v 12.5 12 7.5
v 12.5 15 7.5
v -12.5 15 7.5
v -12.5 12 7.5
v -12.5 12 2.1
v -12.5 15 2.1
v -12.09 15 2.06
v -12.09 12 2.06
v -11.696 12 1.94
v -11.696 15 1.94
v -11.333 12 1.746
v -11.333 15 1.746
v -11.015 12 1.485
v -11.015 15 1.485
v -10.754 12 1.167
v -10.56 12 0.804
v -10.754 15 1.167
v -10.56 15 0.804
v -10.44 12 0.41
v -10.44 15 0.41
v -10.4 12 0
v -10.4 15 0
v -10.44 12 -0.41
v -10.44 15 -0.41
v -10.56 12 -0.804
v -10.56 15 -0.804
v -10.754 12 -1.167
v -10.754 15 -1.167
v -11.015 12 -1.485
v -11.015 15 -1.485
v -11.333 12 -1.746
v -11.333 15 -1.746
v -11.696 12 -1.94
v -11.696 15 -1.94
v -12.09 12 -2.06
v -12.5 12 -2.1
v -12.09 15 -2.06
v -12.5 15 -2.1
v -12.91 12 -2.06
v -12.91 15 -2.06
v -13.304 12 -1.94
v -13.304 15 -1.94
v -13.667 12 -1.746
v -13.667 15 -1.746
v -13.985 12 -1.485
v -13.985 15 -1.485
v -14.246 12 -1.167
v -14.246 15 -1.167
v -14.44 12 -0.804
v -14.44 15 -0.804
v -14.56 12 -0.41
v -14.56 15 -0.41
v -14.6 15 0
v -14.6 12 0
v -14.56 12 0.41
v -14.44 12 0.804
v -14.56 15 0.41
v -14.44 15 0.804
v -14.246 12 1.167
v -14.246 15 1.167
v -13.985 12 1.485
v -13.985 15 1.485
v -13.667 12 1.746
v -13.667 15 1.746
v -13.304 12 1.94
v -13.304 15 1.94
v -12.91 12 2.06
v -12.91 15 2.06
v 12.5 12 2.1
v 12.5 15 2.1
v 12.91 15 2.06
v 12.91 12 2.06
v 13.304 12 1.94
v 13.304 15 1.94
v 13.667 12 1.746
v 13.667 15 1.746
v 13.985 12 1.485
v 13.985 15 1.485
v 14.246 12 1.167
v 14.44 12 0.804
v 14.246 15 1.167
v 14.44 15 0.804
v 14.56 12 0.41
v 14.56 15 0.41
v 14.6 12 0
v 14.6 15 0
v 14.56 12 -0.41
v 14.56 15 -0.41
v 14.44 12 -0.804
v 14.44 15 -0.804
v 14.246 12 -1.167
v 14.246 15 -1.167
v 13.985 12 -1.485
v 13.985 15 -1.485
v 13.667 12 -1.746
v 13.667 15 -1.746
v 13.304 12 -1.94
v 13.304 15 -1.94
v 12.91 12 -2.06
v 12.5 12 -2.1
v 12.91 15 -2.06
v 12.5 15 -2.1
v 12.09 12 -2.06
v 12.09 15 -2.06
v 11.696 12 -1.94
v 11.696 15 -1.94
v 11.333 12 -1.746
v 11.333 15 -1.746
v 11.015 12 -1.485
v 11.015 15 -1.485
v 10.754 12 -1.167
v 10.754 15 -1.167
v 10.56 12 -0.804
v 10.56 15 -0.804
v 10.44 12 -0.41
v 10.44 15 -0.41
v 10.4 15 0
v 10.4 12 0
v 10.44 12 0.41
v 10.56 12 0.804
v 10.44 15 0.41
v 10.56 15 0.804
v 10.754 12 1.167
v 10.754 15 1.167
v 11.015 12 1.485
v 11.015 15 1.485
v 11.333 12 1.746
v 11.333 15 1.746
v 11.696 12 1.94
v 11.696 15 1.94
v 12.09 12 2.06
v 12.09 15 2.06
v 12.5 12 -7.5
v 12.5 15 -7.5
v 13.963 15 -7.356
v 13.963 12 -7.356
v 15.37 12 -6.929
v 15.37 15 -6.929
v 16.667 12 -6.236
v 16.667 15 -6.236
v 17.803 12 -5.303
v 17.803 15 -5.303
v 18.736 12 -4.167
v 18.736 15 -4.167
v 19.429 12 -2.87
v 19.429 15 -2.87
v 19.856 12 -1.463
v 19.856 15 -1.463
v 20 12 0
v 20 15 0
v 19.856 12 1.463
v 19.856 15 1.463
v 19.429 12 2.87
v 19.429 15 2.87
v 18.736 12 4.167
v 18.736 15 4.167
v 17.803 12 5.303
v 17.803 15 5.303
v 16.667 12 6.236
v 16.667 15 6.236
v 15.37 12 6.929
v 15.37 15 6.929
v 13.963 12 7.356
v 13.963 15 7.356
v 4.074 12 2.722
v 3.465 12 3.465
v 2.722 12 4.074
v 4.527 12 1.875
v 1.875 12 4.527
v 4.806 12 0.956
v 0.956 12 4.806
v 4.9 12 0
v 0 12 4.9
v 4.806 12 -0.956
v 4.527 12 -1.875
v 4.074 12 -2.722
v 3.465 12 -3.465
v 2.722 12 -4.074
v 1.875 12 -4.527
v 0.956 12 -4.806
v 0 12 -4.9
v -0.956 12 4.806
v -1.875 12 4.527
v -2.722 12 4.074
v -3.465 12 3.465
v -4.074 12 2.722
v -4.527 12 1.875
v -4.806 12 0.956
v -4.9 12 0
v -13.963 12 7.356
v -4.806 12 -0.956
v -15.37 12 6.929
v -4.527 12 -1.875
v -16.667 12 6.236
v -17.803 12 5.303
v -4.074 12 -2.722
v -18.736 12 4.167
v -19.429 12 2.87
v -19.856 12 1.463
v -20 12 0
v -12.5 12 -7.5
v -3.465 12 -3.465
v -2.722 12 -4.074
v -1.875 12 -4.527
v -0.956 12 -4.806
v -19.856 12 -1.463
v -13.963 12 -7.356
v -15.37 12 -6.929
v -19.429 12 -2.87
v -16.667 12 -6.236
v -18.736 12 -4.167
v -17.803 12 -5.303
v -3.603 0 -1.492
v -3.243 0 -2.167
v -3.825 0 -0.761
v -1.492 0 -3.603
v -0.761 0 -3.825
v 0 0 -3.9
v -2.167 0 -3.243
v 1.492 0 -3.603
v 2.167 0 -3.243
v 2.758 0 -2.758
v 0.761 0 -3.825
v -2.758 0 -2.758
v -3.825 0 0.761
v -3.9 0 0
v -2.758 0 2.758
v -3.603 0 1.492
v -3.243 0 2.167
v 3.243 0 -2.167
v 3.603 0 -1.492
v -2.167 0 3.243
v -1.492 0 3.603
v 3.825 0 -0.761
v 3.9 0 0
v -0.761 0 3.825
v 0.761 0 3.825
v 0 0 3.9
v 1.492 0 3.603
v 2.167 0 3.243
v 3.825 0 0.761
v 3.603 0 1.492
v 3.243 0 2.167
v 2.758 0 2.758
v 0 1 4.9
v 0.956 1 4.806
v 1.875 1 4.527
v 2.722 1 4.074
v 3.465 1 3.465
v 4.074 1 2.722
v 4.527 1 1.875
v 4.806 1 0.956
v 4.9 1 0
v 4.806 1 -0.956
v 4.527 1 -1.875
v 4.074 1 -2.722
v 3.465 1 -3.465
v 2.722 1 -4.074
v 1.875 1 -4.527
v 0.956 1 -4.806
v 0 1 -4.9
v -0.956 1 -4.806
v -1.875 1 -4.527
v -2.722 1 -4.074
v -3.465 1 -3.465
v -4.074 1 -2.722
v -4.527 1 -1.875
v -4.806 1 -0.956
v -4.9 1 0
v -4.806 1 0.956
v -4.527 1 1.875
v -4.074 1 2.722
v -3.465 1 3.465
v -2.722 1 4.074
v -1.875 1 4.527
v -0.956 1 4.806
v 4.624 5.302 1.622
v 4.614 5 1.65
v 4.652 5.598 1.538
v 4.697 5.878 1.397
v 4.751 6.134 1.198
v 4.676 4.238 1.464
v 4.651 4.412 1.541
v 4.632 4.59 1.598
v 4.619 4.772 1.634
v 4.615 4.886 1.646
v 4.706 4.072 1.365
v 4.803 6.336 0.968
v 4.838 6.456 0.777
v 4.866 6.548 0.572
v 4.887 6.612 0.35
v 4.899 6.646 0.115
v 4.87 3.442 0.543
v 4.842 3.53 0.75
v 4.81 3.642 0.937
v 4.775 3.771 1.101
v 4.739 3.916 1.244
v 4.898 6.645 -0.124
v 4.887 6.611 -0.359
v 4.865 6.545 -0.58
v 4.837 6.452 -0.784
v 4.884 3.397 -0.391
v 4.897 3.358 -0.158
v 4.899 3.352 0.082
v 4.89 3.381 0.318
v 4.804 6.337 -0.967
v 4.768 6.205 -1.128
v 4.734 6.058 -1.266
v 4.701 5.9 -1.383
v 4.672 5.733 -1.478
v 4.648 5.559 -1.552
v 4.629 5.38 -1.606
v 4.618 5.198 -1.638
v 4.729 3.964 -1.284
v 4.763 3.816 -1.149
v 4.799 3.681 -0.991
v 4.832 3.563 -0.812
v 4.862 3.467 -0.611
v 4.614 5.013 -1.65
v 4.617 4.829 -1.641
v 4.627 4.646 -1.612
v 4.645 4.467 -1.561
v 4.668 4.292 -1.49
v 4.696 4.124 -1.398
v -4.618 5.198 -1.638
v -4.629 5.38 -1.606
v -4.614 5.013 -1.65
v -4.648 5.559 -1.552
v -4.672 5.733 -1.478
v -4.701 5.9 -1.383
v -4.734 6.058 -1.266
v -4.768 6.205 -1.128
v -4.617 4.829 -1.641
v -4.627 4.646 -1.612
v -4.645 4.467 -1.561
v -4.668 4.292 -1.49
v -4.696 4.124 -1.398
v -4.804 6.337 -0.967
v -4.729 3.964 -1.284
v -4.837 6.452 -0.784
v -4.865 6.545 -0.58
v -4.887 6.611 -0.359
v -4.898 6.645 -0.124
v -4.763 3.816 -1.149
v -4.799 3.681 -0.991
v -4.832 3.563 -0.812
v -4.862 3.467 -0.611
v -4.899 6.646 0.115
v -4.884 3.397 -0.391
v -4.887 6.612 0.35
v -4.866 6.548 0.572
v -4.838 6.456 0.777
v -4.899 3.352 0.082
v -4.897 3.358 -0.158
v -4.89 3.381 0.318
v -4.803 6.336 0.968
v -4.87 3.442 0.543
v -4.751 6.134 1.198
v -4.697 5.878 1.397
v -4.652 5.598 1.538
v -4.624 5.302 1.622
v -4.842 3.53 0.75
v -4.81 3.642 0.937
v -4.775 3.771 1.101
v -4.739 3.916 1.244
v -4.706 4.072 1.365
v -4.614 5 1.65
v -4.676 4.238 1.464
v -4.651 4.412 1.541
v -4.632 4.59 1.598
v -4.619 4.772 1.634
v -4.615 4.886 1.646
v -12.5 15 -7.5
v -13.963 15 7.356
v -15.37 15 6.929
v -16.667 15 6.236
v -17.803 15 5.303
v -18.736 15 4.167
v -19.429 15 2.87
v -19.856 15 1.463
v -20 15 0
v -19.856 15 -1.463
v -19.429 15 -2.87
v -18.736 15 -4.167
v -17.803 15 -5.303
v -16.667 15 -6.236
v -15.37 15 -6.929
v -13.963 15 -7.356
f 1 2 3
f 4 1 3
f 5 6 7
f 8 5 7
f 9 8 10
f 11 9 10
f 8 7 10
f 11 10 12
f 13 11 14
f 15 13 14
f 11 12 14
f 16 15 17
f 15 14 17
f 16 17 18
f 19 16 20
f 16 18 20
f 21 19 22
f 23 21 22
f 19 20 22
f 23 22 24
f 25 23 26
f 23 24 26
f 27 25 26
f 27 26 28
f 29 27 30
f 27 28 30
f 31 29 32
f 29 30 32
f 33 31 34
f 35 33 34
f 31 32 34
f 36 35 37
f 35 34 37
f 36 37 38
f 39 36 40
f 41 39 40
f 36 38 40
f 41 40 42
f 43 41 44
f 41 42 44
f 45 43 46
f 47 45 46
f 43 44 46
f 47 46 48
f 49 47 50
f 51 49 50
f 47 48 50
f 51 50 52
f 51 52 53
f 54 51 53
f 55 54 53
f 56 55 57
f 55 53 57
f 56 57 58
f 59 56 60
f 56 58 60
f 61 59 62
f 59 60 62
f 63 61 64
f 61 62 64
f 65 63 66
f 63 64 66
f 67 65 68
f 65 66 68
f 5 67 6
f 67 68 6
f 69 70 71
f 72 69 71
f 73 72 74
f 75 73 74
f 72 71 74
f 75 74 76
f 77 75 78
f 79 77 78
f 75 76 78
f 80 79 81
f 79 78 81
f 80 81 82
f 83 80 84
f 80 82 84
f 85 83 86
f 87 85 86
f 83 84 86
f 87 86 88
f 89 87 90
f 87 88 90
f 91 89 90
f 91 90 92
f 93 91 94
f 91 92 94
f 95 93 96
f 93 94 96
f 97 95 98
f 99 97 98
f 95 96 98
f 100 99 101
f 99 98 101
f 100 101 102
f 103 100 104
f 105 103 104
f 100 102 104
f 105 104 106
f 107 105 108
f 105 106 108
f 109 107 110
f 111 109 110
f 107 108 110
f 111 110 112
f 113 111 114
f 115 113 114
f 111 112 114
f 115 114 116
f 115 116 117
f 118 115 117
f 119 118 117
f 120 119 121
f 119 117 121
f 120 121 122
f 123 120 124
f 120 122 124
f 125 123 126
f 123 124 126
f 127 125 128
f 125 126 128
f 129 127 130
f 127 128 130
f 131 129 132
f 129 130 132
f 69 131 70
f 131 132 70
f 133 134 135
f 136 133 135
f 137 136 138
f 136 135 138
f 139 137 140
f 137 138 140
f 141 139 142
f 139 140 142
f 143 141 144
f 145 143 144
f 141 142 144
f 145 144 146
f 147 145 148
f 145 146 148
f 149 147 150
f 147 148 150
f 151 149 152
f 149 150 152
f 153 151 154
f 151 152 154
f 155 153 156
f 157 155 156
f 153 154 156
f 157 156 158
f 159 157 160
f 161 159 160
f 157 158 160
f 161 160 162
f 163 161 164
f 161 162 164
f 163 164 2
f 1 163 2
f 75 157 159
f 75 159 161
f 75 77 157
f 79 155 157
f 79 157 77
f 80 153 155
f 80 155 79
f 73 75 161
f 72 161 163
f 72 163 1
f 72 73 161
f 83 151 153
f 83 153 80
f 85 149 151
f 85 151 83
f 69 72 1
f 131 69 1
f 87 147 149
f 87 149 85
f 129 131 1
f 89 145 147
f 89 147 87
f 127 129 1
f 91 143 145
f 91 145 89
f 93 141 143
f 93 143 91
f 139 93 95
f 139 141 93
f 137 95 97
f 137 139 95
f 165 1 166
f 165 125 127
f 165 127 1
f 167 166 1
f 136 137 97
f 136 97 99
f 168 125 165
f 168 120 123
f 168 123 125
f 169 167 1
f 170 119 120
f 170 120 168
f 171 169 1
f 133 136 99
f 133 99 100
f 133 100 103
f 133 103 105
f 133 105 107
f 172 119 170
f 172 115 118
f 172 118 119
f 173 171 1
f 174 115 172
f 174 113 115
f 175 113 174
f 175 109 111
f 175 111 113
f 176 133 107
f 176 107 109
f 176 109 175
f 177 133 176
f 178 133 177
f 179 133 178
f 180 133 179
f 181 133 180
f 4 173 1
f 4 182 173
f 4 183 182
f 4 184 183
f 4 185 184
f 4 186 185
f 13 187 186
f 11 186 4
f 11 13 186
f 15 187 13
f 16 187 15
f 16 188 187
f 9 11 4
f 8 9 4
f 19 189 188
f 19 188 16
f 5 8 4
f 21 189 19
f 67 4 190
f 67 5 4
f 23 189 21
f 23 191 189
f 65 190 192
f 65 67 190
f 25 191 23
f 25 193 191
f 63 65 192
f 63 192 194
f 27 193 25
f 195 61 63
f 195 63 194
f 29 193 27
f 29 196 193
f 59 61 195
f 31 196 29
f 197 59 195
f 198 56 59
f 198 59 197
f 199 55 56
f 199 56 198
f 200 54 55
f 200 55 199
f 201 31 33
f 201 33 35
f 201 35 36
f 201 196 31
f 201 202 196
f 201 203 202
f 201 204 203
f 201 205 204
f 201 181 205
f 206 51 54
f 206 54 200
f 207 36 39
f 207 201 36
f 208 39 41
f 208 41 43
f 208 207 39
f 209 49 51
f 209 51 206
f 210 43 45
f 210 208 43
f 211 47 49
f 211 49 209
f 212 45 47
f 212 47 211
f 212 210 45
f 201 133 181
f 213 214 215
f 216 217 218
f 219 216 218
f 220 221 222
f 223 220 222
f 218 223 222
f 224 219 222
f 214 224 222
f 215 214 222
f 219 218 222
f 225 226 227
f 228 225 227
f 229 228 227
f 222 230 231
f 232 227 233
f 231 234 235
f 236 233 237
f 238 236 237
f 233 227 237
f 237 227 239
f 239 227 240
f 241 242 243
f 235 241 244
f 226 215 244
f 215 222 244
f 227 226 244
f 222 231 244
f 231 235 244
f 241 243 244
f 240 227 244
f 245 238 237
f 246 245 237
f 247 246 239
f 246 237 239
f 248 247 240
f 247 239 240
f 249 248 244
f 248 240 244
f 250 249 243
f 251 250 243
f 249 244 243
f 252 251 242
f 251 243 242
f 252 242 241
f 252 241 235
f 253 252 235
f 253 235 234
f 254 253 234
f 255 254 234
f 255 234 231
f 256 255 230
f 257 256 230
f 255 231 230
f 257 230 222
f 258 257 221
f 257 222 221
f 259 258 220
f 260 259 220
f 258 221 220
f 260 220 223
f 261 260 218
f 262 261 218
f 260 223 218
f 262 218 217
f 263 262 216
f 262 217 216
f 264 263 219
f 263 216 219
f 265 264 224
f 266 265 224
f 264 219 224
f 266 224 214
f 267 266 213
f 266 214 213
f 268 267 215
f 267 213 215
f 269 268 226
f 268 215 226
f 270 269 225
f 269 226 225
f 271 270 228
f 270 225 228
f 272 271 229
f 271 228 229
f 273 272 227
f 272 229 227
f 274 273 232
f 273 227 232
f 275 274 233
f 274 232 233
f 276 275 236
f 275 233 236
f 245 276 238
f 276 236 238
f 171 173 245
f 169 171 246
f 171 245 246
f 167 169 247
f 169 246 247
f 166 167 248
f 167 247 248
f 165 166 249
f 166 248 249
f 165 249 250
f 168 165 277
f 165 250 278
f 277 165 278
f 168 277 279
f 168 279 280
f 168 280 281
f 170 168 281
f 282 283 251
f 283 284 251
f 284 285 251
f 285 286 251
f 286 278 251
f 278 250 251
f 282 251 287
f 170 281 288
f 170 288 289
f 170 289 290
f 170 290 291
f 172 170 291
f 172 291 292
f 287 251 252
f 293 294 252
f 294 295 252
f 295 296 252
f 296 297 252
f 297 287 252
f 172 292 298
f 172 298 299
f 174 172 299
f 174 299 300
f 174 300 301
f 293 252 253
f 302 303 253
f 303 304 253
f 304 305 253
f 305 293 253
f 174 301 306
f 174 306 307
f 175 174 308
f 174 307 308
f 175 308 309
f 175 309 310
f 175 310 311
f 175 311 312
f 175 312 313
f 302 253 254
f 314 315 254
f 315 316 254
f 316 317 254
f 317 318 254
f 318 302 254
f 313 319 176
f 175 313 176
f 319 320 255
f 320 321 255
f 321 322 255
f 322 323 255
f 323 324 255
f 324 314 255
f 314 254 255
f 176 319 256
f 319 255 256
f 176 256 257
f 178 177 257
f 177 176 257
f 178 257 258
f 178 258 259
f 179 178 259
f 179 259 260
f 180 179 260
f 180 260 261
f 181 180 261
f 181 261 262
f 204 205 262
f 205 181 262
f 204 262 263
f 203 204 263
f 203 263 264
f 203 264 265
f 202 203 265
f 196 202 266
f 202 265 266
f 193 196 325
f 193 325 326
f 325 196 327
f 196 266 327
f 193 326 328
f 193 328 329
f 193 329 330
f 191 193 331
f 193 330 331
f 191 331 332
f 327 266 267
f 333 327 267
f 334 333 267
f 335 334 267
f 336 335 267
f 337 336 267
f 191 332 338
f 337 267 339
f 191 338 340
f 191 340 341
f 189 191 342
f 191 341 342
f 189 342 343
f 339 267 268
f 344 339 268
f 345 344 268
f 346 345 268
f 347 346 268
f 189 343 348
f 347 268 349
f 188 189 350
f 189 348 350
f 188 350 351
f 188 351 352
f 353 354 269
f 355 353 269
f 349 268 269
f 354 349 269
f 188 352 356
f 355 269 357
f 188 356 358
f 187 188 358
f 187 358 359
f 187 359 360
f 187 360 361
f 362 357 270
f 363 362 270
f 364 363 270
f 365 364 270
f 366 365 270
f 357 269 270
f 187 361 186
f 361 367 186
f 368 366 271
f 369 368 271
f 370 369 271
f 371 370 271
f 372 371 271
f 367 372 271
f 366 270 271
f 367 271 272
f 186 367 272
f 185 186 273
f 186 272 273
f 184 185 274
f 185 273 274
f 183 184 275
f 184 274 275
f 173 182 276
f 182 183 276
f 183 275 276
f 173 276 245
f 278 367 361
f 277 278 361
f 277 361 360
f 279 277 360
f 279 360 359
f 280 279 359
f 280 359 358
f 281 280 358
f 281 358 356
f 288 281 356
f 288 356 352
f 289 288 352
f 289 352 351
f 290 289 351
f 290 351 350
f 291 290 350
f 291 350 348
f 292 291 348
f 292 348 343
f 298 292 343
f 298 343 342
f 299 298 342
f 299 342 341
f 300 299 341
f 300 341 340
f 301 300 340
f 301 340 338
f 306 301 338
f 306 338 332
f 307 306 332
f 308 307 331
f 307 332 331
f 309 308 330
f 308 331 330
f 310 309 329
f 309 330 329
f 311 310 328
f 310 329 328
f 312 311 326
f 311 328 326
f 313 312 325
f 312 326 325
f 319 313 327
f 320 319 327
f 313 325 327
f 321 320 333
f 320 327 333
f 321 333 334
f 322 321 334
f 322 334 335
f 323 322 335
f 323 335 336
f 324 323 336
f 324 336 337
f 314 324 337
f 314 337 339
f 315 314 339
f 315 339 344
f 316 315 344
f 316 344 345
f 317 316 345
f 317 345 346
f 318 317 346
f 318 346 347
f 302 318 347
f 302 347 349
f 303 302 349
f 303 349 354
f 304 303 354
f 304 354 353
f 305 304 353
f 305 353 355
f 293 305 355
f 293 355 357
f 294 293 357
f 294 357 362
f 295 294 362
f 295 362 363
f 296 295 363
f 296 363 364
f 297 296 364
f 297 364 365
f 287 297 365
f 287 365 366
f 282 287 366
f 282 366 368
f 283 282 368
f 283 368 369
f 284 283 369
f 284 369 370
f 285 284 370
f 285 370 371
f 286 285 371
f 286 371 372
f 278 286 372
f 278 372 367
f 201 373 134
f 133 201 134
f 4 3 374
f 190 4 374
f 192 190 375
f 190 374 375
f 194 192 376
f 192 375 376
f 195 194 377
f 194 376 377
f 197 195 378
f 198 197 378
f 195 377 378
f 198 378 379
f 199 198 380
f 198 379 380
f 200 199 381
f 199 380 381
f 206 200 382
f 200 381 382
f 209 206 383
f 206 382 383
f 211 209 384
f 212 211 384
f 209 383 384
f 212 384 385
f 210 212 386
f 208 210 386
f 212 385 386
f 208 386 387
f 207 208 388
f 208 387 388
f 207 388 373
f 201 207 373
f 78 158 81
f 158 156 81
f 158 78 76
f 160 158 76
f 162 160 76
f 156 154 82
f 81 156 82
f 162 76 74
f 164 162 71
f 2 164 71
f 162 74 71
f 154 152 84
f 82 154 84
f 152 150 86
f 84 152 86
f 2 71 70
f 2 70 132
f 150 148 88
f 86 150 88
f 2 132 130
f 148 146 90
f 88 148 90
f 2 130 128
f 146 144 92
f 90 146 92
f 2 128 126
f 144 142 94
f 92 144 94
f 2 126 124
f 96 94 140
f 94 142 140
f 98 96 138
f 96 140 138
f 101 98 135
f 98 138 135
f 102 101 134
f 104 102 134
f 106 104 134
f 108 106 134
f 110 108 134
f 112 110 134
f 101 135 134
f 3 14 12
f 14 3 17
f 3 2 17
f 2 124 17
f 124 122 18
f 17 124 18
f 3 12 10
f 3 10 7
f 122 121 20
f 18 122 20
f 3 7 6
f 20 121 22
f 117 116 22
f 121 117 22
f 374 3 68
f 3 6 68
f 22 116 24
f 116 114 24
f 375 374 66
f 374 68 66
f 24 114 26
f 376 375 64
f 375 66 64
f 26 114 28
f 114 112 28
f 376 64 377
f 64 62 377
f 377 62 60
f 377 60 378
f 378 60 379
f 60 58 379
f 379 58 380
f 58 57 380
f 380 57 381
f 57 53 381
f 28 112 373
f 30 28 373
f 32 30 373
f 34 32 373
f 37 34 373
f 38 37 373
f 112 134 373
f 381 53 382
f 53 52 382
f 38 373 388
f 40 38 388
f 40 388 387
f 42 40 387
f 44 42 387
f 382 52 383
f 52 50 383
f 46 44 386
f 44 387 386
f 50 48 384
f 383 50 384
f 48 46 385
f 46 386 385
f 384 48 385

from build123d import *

# Parameters (mm, degrees)
SKETCH_1_R         = 4.9
EXTRUDE_1_DEPTH    = 15
HOLE_WIZARD_M4_1_D = 3.3
CHAMFER_1_SIZE     = 1
SKETCH_6_R         = 2.1
EXTRUDE_2_DEPTH    = 3


with BuildPart() as part:
    # 草图1 → 凸台-拉伸1 (new body)
    with BuildSketch(Plane(origin=(0, 0, 0), x_dir=(1, 0, 0), z_dir=(0, 1, 0))):
        with Locations(Location((0, 0, 0), (0, 0, 270))):
            Circle(SKETCH_1_R)
    extrude(amount=EXTRUDE_1_DEPTH)

    # M4 螺纹孔1 (through all)
    with Locations(Plane(origin=(4.9, 0, 0), x_dir=(0, 0, -1), z_dir=(1, 0, 0))):
        with Locations((0, 5)):
            Hole(HOLE_WIZARD_M4_1_D / 2)

    # 倒角1
    chamfer_1_edges = [part.edges().sort_by_distance(p)[0] for p in [
        (0, 0, -4.9),
    ]]
    chamfer(chamfer_1_edges, length=CHAMFER_1_SIZE)

    # 草图6 → 凸台-拉伸2 (add)
    with BuildSketch(Plane(origin=(0, 15, 0), x_dir=(1, 0, 0), z_dir=(0, 1, 0))):
        with BuildLine():
            Line((-12.5, 7.5), (12.5, 7.5))
            ThreePointArc((12.5, 7.5), (20, 0), (12.5, -7.5))
            Line((12.5, -7.5), (-12.5, -7.5))
            ThreePointArc((-12.5, -7.5), (-20, 0), (-12.5, 7.5))
        make_face()
        with Locations(Location((-12.5, 0, 0), (0, 0, 270))):
            Circle(SKETCH_6_R, mode=Mode.SUBTRACT)
        with Locations(Location((12.5, 0, 0), (0, 0, 270))):
            Circle(SKETCH_6_R, mode=Mode.SUBTRACT)
    extrude(amount=-EXTRUDE_2_DEPTH)


solid = part.part
